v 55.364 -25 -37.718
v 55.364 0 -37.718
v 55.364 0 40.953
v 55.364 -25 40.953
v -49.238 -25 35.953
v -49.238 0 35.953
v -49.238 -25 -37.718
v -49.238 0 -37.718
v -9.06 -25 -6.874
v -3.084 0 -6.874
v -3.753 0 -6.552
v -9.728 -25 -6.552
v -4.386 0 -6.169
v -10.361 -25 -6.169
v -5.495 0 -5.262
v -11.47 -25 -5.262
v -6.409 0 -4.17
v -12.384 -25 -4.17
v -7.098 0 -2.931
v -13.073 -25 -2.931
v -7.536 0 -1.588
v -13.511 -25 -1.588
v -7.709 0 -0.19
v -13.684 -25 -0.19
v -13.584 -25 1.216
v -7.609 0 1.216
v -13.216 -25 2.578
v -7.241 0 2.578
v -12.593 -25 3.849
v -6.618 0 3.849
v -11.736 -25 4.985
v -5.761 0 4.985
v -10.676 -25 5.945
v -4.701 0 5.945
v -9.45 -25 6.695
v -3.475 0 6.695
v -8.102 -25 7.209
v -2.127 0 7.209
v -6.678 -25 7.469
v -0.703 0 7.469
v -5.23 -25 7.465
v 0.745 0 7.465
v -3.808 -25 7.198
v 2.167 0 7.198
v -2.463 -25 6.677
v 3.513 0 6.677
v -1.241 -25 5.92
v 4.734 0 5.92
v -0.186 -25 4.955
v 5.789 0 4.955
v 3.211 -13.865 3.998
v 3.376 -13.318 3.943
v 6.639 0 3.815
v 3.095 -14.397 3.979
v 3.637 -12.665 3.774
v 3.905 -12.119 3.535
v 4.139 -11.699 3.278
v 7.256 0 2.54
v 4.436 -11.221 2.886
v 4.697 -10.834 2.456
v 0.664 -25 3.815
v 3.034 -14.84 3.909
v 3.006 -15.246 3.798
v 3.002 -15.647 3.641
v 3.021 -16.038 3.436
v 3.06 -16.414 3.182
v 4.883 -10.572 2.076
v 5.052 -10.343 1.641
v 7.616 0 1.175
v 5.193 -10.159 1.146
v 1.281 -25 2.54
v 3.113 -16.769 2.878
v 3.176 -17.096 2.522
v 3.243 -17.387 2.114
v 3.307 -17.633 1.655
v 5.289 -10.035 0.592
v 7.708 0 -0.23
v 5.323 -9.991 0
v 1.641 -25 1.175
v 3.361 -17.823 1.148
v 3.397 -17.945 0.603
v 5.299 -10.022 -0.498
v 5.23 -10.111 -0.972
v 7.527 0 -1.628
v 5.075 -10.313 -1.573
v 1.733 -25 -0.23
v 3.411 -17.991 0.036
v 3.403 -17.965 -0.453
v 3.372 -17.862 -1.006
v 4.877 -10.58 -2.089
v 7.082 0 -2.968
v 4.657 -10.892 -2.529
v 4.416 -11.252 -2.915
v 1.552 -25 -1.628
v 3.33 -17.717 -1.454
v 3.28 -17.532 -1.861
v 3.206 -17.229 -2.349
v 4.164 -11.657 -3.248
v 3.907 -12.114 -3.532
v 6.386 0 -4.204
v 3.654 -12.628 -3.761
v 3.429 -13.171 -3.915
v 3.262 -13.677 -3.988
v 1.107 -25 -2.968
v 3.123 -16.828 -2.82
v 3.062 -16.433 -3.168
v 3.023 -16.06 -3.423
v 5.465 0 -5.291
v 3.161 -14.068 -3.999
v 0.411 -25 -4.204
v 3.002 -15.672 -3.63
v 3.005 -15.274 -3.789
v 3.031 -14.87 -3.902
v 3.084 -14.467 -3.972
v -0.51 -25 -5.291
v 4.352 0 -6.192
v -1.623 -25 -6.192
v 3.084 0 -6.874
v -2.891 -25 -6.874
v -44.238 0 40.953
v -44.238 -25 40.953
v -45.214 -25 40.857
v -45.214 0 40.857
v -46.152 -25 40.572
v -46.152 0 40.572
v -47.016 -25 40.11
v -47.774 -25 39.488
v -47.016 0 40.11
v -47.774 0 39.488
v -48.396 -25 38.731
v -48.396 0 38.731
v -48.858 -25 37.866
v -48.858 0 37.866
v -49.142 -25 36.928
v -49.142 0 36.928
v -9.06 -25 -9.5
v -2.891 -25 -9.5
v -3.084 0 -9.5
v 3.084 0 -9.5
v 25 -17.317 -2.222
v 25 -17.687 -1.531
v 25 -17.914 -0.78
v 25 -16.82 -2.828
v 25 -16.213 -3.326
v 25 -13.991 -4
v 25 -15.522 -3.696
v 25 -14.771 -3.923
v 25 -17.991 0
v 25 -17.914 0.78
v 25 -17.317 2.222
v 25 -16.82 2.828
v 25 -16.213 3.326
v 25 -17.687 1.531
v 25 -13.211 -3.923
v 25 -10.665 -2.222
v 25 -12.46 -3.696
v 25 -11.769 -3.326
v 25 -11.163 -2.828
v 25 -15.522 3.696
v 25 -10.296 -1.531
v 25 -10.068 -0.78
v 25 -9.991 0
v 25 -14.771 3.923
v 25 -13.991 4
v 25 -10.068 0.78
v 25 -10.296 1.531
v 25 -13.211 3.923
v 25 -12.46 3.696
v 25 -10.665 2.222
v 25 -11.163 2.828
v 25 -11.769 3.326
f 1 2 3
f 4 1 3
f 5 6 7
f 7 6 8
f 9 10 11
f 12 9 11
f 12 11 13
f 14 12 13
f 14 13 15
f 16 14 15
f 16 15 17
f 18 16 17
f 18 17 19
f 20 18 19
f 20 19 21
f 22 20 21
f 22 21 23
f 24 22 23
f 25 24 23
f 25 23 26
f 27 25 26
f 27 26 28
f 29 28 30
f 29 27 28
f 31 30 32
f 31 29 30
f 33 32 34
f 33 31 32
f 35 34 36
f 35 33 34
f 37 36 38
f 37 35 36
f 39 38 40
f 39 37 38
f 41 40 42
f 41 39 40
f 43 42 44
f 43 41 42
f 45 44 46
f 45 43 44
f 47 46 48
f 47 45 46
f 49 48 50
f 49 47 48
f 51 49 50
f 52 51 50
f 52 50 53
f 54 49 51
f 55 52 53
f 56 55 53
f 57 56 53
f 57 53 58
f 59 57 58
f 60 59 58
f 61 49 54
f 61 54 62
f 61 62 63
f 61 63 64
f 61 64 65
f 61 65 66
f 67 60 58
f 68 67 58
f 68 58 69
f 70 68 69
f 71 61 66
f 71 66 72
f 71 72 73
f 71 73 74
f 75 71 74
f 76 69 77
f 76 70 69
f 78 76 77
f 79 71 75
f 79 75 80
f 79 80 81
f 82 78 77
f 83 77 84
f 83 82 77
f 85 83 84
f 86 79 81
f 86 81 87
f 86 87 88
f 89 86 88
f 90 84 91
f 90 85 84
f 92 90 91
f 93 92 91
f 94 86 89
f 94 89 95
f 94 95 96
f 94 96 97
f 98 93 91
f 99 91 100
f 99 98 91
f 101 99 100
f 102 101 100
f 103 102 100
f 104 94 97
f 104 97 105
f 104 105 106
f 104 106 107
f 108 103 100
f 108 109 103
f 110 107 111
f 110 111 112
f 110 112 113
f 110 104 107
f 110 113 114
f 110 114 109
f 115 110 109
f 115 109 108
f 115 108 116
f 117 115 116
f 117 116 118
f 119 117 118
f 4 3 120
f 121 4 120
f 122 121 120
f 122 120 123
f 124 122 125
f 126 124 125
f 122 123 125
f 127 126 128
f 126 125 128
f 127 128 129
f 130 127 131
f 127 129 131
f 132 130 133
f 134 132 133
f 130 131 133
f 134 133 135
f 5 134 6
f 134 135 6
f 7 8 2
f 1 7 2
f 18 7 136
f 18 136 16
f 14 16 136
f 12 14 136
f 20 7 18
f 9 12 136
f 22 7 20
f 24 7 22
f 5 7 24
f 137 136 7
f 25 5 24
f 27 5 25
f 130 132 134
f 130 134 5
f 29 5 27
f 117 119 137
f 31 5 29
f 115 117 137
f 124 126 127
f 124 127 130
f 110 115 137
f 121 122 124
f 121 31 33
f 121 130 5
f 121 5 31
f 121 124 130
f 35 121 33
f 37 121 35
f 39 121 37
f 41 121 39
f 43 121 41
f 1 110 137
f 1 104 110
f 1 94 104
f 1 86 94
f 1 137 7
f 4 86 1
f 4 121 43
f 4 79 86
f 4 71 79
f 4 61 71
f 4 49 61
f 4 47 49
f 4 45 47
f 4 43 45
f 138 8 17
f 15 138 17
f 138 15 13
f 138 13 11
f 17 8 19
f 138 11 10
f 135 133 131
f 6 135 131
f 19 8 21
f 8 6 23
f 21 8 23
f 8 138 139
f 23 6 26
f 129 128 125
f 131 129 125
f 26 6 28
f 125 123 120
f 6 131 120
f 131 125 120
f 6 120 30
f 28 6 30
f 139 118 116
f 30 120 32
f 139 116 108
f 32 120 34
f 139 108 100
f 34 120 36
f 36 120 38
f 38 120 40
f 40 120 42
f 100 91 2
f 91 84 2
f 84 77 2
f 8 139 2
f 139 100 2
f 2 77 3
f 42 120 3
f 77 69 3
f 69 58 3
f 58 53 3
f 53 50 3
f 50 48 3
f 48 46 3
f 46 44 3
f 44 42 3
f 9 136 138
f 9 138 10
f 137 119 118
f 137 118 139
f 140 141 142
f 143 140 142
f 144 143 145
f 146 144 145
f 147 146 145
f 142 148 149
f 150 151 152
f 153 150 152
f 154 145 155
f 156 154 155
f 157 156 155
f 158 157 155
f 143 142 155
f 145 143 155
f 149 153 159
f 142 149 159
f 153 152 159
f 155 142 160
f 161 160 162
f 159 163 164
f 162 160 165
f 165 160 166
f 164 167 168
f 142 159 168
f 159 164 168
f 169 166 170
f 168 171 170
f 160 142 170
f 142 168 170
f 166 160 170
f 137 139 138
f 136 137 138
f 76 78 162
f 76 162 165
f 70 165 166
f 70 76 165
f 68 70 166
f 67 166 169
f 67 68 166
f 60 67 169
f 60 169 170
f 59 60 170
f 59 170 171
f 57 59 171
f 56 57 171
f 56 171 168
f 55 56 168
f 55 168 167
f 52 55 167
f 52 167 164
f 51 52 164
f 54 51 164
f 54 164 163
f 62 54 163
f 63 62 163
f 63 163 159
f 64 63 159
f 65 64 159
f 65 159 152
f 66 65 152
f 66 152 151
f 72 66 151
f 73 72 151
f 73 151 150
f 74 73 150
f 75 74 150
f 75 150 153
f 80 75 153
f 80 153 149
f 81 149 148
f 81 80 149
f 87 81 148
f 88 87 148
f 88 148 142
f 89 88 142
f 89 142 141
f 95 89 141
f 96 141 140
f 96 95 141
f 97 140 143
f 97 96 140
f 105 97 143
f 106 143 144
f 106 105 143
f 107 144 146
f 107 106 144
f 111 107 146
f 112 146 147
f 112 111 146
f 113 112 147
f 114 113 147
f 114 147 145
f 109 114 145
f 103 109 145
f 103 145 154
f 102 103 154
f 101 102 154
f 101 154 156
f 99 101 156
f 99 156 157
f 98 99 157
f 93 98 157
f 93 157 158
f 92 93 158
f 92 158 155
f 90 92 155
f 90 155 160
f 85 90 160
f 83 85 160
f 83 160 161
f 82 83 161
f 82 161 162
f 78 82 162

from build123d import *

# Parameters (mm, degrees)
F1_DEPTH      = 25
F4_DEPTH      = 24.3161811297
F4_DEPTH_BACK = 24.3161811297
F5_R          = 4
F6_DEPTH      = 25


with BuildPart() as f1:
    # F0 (on Front) → F1 (new body)
    with BuildSketch(Plane.XZ):
        with BuildLine():
            Line((55.3635079414, 40.9526537359), (-44.2383363843, 40.9526537359))
            ThreePointArc((-44.2383363843, 40.9526537359), (-47.7738702902, 39.4881876418), (-49.2383363843, 35.9526537359))
            Line((-49.2383363843, 35.9526537359), (-49.2383363843, -37.7181139815))
            Line((-49.2383363843, -37.7181139815), (55.3635079414, -37.7181139815))
            Line((55.3635079414, -37.7181139815), (55.3635079414, 40.9526537359))
        make_face()
    extrude(amount=F1_DEPTH)

    # F3 (on 3pt) → F4 (cut, two sides)
    with BuildSketch(Plane(origin=(-2.6606007252, -11.1321497148, 0), x_dir=(-0.9726072452, 0.2324546119, 0), z_dir=(0.2324546119, 0.9726072452, 0))) as f4_sk:
        with BuildLine():
            Line((3, -9.5), (3, -6.8738635424))
            ThreePointArc((3, -6.8738635424), (0, 7.5), (-3, -6.8738635424))
            Line((-3, -6.8738635424), (-3, -9.5))
            Line((-3, -9.5), (3, -9.5))
        make_face()
    extrude(amount=-F4_DEPTH, mode=Mode.SUBTRACT)
    extrude(f4_sk.sketch, amount=F4_DEPTH_BACK, mode=Mode.SUBTRACT)

    # F5 (on Right) → F6 (cut)
    with BuildSketch(Plane.YZ):
        with Locations((-13.9910853659, 0)):
            Circle(F5_R)
    extrude(amount=F6_DEPTH, mode=Mode.SUBTRACT)


solid = f1.part
